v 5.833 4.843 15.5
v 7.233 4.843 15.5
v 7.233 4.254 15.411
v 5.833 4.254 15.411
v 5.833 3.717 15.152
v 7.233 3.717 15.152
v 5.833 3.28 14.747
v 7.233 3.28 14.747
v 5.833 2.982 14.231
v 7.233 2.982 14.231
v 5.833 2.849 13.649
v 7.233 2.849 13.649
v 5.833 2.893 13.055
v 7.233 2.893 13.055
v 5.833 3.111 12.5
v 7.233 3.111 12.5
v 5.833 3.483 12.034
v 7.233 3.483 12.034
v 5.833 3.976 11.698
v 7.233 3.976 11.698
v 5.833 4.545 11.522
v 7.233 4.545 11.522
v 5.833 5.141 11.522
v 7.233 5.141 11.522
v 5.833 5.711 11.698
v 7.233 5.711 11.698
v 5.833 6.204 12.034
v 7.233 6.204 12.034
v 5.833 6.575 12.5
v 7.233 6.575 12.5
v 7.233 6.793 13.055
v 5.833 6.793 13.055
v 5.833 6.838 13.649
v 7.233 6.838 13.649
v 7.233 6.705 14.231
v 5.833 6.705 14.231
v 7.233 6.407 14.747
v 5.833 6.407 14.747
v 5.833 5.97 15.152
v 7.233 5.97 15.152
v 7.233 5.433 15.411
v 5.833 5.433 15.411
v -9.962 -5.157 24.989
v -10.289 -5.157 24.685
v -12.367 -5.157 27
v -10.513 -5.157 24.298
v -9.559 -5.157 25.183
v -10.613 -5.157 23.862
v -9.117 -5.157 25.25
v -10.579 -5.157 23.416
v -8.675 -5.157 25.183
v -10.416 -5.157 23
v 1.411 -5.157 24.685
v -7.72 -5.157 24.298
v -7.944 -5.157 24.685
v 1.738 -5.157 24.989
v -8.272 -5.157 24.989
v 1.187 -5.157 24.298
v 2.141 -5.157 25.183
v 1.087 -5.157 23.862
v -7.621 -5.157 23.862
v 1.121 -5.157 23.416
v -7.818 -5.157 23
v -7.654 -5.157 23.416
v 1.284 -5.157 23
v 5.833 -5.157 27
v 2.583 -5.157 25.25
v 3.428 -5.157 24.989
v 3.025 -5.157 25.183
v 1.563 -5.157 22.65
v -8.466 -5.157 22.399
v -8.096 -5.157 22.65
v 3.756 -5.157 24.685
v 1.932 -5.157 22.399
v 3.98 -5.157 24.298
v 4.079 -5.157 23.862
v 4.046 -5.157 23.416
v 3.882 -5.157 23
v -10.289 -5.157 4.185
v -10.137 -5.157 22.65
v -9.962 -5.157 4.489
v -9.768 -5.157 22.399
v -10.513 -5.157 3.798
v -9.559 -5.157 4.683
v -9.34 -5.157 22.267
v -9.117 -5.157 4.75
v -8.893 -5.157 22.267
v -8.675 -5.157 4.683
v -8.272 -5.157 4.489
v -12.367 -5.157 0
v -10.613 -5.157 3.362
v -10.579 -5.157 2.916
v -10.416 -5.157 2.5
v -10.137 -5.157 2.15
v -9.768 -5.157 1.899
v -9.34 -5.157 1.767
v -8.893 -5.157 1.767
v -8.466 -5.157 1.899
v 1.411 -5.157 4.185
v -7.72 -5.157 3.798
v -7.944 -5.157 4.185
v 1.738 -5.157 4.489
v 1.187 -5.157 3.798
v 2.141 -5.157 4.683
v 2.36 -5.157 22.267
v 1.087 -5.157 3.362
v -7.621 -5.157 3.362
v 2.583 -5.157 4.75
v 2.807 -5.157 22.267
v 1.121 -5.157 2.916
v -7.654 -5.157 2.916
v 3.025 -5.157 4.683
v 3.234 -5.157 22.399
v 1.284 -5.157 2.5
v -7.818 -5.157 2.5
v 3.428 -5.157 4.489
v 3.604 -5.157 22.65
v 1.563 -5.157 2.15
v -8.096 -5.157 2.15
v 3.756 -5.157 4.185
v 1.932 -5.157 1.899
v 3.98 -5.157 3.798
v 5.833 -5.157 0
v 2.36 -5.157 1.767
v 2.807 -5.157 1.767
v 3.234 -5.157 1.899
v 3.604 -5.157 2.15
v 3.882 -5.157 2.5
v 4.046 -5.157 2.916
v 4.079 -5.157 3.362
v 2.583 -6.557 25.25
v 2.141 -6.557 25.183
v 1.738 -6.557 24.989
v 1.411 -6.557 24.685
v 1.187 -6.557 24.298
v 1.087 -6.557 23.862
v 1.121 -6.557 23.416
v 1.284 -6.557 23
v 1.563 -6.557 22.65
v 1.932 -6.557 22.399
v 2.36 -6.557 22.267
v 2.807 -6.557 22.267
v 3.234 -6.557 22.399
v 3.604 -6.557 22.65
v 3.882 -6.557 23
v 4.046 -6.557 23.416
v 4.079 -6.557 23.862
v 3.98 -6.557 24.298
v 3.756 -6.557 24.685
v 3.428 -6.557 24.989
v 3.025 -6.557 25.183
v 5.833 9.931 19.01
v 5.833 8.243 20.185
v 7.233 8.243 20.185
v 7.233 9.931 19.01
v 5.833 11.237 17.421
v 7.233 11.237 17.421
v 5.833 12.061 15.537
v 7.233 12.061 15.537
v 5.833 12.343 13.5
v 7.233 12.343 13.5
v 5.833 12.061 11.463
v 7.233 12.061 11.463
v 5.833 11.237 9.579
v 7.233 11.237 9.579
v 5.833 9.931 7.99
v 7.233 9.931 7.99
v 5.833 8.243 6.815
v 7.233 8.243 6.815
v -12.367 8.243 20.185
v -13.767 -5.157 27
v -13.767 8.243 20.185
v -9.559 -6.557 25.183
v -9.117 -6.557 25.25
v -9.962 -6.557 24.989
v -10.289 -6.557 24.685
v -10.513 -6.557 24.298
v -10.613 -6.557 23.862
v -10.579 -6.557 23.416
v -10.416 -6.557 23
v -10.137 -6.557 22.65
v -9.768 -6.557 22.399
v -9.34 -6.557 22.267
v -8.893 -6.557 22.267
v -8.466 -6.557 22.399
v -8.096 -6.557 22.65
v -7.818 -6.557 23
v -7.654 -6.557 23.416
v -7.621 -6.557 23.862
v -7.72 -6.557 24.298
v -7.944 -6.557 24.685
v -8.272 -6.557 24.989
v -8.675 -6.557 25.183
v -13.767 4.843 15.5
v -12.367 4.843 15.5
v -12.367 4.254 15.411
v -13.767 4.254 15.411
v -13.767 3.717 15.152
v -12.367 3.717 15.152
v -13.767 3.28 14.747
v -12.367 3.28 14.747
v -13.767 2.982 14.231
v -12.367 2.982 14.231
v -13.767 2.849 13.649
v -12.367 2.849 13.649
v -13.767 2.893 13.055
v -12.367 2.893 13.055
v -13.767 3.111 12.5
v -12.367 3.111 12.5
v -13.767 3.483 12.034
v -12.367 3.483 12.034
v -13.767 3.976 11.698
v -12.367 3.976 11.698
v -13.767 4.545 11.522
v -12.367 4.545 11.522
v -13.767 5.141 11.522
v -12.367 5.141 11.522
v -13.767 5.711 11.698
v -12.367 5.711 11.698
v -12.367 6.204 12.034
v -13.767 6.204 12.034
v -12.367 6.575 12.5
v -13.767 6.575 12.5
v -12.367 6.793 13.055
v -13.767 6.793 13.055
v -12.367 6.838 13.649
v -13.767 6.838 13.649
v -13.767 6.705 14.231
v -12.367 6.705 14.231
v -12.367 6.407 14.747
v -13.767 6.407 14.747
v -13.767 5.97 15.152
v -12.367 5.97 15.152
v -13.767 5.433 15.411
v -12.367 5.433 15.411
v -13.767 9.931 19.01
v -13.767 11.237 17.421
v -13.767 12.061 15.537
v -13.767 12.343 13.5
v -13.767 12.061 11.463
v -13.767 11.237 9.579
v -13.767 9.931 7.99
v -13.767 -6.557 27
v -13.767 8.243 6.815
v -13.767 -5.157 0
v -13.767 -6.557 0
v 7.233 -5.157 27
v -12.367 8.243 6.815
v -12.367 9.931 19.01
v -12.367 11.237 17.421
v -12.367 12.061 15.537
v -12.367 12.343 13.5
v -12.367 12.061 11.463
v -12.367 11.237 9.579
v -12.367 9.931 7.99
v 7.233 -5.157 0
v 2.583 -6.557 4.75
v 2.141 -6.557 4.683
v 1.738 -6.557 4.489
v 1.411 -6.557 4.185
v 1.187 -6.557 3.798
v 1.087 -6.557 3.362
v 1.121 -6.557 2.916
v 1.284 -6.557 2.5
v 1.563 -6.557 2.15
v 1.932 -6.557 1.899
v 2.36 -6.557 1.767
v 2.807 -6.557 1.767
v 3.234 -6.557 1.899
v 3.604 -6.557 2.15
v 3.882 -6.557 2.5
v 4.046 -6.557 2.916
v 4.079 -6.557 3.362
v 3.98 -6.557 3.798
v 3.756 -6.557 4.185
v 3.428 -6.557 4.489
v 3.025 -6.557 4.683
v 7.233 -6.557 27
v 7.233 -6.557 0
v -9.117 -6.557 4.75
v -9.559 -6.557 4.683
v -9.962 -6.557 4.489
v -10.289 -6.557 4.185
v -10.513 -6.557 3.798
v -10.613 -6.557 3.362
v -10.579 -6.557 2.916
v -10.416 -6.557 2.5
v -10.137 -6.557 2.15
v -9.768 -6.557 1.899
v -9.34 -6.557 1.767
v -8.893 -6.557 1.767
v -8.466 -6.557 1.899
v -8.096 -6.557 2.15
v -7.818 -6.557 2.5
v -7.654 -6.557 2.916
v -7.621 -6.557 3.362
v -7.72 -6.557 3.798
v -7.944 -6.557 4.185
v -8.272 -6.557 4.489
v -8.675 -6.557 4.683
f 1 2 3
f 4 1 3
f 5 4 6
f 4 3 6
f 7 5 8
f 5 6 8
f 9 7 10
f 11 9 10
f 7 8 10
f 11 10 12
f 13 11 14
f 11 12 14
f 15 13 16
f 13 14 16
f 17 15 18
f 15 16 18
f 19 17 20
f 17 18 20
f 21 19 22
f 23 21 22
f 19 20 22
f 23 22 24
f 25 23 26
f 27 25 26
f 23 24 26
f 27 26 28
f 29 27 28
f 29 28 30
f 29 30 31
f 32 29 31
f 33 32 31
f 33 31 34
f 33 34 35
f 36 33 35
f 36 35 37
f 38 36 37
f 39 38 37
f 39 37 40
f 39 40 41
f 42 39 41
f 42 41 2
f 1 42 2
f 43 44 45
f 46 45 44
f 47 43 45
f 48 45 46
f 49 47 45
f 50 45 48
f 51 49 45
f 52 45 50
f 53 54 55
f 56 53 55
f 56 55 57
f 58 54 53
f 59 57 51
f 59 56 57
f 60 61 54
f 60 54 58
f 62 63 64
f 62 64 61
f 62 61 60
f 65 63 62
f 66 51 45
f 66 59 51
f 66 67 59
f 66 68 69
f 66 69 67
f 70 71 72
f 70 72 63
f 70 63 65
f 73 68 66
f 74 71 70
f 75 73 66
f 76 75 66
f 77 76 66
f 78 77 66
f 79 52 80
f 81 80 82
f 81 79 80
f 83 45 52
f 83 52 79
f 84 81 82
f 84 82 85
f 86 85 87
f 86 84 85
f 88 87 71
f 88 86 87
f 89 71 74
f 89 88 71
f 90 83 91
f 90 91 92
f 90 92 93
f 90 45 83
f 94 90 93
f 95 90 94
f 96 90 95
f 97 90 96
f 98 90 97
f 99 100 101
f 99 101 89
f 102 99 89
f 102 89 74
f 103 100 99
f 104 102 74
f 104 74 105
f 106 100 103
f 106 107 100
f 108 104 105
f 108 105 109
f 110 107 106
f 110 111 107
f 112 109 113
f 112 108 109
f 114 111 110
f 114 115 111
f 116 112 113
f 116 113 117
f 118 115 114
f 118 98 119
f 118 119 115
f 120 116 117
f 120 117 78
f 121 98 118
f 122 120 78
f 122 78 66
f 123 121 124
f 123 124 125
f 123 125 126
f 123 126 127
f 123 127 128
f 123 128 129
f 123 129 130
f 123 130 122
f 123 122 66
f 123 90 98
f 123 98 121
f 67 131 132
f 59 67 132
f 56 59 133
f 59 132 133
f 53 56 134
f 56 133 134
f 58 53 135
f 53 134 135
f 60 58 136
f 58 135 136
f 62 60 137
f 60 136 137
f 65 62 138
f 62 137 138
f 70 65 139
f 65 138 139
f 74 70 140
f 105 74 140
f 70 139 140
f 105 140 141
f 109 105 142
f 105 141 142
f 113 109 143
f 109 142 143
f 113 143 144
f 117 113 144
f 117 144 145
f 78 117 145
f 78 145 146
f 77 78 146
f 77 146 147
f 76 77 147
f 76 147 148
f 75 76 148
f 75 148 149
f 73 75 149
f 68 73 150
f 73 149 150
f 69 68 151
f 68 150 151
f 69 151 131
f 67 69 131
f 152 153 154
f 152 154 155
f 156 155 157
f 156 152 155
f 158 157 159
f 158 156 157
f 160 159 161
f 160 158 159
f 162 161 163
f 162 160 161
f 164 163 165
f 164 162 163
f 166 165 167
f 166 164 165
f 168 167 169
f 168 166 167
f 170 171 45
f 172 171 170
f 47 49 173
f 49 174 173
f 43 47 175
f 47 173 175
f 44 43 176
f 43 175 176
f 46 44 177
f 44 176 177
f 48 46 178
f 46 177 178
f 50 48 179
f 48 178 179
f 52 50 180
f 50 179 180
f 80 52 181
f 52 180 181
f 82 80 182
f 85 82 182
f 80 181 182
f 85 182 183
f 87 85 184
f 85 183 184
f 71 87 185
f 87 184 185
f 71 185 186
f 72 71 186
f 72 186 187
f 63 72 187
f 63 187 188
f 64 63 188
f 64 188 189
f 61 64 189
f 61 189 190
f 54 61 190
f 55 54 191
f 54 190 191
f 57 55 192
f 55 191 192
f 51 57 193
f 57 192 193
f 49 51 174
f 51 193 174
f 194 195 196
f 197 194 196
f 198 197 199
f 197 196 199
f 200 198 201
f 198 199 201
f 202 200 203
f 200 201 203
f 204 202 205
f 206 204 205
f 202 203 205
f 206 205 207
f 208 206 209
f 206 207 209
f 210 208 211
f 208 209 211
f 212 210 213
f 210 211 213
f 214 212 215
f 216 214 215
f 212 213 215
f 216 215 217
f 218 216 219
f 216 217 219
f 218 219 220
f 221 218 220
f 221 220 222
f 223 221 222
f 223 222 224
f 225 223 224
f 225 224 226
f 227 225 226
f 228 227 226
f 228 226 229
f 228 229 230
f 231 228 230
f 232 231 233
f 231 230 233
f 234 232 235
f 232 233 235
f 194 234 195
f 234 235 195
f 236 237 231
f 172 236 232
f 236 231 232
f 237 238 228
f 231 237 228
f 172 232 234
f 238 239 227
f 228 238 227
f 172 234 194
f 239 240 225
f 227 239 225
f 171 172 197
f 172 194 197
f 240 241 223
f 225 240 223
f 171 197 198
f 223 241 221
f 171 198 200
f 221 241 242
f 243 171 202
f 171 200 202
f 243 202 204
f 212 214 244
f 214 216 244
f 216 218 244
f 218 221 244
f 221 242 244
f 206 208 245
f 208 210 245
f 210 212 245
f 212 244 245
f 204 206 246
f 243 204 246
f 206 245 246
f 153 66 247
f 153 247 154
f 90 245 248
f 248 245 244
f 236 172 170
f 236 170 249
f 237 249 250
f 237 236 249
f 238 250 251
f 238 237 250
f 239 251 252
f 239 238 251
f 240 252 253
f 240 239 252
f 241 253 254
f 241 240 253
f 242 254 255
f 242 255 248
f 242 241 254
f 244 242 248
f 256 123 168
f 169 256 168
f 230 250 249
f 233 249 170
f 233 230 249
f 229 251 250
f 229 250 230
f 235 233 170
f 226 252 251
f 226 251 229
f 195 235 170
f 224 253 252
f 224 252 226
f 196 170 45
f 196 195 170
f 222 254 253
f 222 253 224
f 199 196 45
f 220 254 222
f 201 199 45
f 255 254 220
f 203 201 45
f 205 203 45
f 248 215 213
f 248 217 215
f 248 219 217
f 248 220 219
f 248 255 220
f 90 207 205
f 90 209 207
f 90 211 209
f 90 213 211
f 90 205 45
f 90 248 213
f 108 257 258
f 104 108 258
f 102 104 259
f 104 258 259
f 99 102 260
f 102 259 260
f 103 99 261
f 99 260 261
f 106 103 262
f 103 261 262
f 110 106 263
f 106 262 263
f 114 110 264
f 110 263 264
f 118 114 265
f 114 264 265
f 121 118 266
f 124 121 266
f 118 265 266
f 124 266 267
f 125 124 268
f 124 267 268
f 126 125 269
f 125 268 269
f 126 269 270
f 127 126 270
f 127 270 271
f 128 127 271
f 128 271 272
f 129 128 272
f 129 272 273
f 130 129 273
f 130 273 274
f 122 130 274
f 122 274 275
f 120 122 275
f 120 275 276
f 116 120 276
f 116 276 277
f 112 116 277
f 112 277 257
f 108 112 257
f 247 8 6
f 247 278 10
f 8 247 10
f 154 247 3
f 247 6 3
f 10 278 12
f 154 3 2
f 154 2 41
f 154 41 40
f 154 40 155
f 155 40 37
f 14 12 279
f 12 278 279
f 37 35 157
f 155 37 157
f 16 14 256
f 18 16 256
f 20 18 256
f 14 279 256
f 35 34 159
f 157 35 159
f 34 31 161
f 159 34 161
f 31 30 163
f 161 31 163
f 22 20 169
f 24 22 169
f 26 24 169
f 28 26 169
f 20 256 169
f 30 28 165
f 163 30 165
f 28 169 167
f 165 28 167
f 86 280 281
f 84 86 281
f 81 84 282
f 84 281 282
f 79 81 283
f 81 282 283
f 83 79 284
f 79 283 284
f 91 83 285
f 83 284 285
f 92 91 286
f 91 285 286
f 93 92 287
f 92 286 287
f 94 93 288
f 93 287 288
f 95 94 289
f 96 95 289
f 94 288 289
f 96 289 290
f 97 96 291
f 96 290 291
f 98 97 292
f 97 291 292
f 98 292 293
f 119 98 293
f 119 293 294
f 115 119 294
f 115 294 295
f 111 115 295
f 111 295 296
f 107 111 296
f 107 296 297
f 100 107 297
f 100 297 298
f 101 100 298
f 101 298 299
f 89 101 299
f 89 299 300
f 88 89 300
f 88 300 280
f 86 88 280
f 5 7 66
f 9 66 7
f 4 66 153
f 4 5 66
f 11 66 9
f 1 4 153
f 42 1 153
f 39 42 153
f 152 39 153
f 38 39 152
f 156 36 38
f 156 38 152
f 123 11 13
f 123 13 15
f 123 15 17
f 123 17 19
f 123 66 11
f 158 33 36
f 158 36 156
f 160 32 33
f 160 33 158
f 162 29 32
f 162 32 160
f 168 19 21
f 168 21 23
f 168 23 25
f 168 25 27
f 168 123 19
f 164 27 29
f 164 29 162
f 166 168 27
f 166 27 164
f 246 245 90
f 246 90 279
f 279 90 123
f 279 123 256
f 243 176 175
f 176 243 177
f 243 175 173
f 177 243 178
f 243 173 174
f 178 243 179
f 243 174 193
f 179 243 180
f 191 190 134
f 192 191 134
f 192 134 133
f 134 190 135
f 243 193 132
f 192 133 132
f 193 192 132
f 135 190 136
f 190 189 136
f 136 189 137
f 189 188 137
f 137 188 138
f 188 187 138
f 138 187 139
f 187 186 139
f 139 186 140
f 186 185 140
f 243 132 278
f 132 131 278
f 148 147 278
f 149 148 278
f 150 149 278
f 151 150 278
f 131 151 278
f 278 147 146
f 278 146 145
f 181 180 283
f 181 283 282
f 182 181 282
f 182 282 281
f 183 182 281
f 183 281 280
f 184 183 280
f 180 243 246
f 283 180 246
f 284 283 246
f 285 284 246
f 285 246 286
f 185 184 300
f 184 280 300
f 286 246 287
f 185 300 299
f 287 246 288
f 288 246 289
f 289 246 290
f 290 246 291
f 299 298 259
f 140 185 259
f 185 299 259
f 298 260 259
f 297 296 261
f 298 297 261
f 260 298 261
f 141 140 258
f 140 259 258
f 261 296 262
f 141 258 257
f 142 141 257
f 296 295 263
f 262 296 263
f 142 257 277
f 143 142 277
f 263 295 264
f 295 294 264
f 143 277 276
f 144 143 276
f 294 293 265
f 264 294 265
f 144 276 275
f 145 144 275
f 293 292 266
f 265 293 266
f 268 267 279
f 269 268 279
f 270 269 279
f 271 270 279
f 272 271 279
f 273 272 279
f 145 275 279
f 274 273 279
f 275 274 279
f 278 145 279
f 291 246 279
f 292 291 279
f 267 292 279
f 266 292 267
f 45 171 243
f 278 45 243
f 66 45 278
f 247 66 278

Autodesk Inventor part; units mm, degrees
ref_plane "YZ Plane" through (0, 0, 0) normal (1, 0, 0) x (0, 1, 0)
ref_plane "XZ Plane" through (0, 0, 0) normal (0, 1, 0) x (-1, 0, 0)
ref_plane "XY Plane" through (0, 0, 0) normal (0, 0, 1) x (1, 0, 0)
sketch "Szkic1" plane through (0, 0, 0) normal (0, 0, 1) x (1, 0, 0)
  line L0 (-13.7667, 13.4433) -> (-13.7667, -6.5567)
  line L1 (-13.7667, -6.5567) -> (7.2333, -6.5567)
  line L2 (7.2333, -6.5567) -> (7.2333, 13.4433)
  line L3 (7.2333, 13.4433) -> (5.8333, 13.4433)
  line L4 (-13.7667, 13.4433) -> (-12.3667, 13.4433)
  line L5 (-12.3667, -5.1567) -> (5.8333, -5.1567)
  line L6 (5.8333, -5.1567) -> (5.8333, 13.4433)
  line L7 (-12.3667, 13.4433) -> (-12.3667, -5.1567)
  point P0 (0, 0)
  dimension "d0" = 21
  dimension "d1" = 20
  dimension "d2" = 1.4
  dimension "d3" = 1.4
  dimension "d4" = 1.4
extrude "Wyciągnięcie proste1" add sketch "Szkic1" along normal blind 27
sketch "Szkic2" plane through (-13.7667, -6.5567, 0) normal (-1, 0, 0) x (0, 0, 1)
  line L0 (0, 20) -> (0, 0) projected
  line L1 (0, 0) -> (27, 0) projected
  line L2 (27, 20) -> (27, 0) projected
  line L3 (0, 20) -> (27, 20) projected
  line L4 (0, 1.4) -> (27, 1.4) projected
  arc A0 (20.1851, 14.7999) -> (6.8149, 14.7999) centre (13.5, 11.4) ccw
  line L5 (27, 1.4) -> (27, 20) projected
  line L6 (27, 1.4) -> (20.1851, 14.7999)
  line L7 (0, 1.4) -> (0, 20) projected
  line L8 (0, 1.4) -> (6.8149, 14.7999)
  line L9 (6.8149, 14.7999) -> (9.4595, 20)
  line L10 (20.1851, 14.7999) -> (17.5405, 20)
  point P0 (0, 6.5567)
  dimension "d7" = 27
  dimension "d8" = 13.5
  dimension "d9" = 10
  dimension "d10" = 15
extrude "Wyciągnięcie proste2" cut sketch "Szkic2" against normal through all contours L3 L9 L8 L0 | L3 L10 A0 L9 | L6 L10 L3 L2
hole "Otwór1" at (-13.7667, 4.8433, 13.5) direction (1, 0, 0) diameter 4 end through all
sketch "Szkic3" plane through (-12.3667, -5.1567, 0) normal (0, 1, 0) x (1, 0, 0)
  line L0 (18.2, 0) -> (0, 0) projected
  line L1 (0, 0) -> (0, -27) projected
  line L2 (18.2, -27) -> (0, -27) projected
  line L3 (18.2, 0) -> (18.2, -27) projected
  line L4 (18.2, -20.5) -> (0, -20.5)
  line L5 (18.2, -6.5) -> (0, -6.5)
  point P0 (12.3667, 0)
  point P1 (14.95, -23.75)
  point P2 (3.25, -23.75)
  point P3 (14.95, -3.25)
  point P4 (3.25, -3.25)
  dimension "d20" = 14
  dimension "d21" = 27
  dimension "d22" = 6.5
  dimension "d23" = 3.25
  dimension "d24" = 3.25
  dimension "d25" = 3.25
  dimension "d26" = 3.25
  dimension "d27" = 3.25
  dimension "d28" = 3.25
  dimension "d29" = 3.25
  dimension "d30" = 3.25
hole "Otwór2" at (2.5833, -5.1567, 23.75) at (-9.1167, -5.1567, 23.75) at (2.5833, -5.1567, 3.25) at (-9.1167, -5.1567, 3.25) direction (0, -1, 0) diameter 3 end through all
equation "\"d8\" = 0.5 * d7"
equation "\"d22\" = -0.5 * d20 + 0.5 * d21"
equation "\"d23\" = 0.5 * d22"
equation "\"d24\" = d23"
equation "\"d25\" = d23"
equation "\"d26\" = d23"
equation "\"d27\" = d23"
equation "\"d28\" = d23"
equation "\"d29\" = d23"
equation "\"d30\" = d23"
properties part number "CNCM_Y_Axis_Tensioning_System_C_Sec_Idler"
